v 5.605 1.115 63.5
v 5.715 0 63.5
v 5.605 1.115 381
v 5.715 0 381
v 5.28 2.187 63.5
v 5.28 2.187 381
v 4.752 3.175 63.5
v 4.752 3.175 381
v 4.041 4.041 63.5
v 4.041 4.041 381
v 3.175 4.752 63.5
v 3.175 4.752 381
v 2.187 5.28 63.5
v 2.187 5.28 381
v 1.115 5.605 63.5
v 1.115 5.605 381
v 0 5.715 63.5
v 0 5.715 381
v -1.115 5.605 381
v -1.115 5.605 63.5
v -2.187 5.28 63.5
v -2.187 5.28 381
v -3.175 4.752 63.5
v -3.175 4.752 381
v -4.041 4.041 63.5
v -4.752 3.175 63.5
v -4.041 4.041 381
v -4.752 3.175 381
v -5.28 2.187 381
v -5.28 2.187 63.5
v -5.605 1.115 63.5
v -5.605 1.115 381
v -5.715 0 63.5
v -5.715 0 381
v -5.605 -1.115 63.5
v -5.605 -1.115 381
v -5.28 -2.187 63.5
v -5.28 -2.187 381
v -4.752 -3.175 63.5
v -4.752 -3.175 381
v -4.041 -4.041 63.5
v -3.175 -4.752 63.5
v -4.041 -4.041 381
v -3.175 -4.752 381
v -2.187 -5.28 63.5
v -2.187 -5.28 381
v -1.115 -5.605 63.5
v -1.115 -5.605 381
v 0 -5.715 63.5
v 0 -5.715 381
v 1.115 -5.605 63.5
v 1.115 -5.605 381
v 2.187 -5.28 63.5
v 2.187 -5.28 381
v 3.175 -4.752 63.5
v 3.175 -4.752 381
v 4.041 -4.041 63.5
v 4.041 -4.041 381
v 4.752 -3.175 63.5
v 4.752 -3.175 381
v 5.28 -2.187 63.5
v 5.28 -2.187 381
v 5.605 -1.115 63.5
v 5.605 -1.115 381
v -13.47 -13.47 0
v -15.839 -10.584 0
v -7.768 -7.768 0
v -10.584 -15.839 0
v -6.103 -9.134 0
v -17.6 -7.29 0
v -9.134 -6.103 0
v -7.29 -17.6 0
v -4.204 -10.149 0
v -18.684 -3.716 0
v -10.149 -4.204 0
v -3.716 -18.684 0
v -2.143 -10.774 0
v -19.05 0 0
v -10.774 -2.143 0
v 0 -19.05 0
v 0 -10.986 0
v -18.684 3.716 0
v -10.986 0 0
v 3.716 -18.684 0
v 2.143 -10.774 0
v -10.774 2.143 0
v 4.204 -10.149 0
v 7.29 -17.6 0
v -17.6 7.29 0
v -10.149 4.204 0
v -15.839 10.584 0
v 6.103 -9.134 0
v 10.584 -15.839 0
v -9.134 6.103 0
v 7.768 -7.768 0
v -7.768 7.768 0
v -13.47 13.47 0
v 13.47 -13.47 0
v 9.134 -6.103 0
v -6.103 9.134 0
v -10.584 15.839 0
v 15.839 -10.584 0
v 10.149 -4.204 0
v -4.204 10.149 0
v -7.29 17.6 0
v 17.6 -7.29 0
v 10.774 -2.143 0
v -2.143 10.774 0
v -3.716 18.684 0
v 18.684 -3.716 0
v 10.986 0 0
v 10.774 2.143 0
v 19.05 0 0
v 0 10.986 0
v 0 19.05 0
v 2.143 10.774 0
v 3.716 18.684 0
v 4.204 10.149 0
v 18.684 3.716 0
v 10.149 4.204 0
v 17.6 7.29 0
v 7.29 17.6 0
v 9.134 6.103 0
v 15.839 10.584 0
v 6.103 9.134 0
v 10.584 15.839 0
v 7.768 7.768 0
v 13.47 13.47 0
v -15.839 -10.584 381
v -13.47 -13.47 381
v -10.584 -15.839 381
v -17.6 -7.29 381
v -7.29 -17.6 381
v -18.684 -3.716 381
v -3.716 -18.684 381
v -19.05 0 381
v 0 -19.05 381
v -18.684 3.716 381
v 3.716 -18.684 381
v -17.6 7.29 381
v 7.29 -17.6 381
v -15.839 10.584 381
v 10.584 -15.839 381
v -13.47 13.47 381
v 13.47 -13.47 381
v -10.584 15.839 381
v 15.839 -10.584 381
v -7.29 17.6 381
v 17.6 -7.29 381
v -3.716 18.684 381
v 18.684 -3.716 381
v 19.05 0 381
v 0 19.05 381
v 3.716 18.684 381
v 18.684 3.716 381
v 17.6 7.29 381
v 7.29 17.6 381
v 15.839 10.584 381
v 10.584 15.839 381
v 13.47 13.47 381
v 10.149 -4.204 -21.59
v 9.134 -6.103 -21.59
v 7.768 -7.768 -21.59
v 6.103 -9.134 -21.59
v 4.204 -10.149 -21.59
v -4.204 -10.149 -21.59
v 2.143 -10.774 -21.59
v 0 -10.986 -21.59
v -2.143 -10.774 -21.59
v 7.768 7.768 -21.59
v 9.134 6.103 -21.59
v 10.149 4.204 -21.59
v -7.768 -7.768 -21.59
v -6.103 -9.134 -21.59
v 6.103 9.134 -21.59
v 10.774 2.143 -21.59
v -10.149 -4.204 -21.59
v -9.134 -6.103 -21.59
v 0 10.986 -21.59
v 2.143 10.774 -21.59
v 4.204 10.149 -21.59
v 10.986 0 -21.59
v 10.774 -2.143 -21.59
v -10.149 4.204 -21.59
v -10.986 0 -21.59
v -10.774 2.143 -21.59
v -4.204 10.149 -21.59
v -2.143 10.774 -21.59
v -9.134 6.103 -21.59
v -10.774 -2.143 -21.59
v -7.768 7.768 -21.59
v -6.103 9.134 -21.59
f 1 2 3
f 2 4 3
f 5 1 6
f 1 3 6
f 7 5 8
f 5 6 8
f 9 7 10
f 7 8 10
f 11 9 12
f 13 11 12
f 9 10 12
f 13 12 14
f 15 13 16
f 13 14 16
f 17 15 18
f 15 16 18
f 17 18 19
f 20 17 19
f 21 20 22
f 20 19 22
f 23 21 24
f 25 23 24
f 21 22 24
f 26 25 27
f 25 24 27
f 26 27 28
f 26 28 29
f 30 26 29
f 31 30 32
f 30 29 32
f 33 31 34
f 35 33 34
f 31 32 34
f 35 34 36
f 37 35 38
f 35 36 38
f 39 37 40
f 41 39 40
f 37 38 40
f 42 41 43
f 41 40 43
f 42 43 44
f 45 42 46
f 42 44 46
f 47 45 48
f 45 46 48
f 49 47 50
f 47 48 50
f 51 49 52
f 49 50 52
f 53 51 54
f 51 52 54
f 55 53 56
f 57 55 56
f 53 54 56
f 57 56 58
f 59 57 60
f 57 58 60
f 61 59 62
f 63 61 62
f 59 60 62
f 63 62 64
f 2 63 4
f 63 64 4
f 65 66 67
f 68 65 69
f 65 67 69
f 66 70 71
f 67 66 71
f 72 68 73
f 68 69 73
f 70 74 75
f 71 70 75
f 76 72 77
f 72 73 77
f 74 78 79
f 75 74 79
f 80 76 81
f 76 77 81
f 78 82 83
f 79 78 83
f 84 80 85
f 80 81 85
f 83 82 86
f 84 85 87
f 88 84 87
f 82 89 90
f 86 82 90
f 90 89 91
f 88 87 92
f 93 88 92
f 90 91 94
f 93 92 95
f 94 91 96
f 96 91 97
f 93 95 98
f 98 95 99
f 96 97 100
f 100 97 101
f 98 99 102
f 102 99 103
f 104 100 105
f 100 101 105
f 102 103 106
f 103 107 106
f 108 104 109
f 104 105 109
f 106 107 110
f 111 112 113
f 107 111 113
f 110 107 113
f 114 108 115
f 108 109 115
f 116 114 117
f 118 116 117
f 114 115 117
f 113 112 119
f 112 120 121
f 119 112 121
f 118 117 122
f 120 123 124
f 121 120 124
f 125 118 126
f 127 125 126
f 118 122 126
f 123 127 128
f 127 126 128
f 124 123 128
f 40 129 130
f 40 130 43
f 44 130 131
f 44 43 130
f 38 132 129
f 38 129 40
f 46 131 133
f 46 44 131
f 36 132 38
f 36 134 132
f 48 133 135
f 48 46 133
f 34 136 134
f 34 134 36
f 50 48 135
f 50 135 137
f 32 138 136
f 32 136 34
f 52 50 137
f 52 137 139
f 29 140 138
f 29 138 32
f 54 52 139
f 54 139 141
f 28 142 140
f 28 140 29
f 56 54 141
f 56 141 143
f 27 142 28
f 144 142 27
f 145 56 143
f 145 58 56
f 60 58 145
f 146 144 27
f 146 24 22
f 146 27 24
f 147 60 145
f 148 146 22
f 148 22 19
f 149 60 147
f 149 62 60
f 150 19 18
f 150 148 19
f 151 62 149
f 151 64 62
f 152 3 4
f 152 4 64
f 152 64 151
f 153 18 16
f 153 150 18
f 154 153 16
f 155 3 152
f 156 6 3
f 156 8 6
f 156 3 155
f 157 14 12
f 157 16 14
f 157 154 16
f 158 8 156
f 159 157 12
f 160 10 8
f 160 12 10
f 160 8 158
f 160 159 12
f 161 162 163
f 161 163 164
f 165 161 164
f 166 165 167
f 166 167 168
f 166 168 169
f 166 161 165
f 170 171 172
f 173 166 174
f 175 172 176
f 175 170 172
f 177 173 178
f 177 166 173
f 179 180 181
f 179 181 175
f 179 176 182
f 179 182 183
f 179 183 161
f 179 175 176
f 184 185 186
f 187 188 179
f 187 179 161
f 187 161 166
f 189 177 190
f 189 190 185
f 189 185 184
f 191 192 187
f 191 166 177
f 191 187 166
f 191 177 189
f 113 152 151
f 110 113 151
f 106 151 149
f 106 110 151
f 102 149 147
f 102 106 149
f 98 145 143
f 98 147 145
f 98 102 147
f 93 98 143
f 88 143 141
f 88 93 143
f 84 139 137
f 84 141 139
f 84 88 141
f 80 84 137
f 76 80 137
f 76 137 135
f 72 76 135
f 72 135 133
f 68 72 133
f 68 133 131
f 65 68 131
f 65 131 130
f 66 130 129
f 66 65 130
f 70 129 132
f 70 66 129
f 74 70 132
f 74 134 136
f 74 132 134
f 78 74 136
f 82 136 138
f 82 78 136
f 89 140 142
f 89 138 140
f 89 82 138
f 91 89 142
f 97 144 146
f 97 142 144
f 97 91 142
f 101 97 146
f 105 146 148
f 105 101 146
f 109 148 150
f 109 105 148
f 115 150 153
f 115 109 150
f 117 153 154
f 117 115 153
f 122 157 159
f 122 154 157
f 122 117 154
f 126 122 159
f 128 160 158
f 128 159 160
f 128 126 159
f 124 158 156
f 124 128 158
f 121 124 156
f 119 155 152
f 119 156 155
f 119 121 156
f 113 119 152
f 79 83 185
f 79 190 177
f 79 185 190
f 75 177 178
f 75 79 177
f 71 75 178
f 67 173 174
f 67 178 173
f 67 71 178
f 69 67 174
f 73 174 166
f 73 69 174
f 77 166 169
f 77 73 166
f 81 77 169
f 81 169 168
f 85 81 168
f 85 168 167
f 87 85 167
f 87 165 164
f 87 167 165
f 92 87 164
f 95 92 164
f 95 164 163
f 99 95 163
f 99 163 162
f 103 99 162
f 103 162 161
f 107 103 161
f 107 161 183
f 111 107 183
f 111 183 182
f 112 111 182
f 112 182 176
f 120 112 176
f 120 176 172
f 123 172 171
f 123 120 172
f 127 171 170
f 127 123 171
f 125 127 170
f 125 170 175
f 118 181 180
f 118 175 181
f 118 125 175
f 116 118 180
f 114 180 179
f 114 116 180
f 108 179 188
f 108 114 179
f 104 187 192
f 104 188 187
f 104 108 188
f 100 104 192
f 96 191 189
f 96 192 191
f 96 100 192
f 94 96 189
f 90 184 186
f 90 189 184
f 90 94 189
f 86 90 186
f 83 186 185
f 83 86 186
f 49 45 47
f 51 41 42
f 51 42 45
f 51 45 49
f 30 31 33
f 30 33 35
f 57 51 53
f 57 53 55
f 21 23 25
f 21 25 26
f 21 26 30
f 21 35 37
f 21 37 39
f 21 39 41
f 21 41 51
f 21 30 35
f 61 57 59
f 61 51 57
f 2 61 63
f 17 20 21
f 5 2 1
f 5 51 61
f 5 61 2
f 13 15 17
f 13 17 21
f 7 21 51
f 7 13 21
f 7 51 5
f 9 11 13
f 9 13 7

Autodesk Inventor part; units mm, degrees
ref_plane "YZ Plane" through (0, 0, 0) normal (1, 0, 0) x (0, 1, 0)
ref_plane "XZ Plane" through (0, 0, 0) normal (0, 1, 0) x (-1, 0, 0)
ref_plane "XY Plane" through (0, 0, 0) normal (0, 0, 1) x (1, 0, 0)
sketch "Sketch1" plane through (0, 0, 0) normal (0, 0, 1) x (1, 0, 0)
  circle A0 centre (0, 0) radius 19.05
  dimension "d0" = 38.1
extrude "Extrusion1" add sketch "Sketch1" along normal blind 381
sketch "Sketch2" plane through (0, 0, 381) normal (0, 0, 1) x (1, 0, 0)
  circle A0 centre (0, 0) radius 5.715
  dimension "d3" = 11.43
extrude "Extrusion2" cut sketch "Sketch2" against normal blind 317.5
sketch "Sketch3" plane through (0, 0, 0) normal (0, 0, -1) x (-1, 0, 0)
  circle A0 centre (0, 0) radius 10.9855
  dimension "d6" = 21.971
extrude "Extrusion3" add sketch "Sketch3" along normal blind 21.59
thread "Thread1" size "M22x1.5" class "6g" standard "ANSI Metric M Profile" full length
properties part number "Cylinder 1"
